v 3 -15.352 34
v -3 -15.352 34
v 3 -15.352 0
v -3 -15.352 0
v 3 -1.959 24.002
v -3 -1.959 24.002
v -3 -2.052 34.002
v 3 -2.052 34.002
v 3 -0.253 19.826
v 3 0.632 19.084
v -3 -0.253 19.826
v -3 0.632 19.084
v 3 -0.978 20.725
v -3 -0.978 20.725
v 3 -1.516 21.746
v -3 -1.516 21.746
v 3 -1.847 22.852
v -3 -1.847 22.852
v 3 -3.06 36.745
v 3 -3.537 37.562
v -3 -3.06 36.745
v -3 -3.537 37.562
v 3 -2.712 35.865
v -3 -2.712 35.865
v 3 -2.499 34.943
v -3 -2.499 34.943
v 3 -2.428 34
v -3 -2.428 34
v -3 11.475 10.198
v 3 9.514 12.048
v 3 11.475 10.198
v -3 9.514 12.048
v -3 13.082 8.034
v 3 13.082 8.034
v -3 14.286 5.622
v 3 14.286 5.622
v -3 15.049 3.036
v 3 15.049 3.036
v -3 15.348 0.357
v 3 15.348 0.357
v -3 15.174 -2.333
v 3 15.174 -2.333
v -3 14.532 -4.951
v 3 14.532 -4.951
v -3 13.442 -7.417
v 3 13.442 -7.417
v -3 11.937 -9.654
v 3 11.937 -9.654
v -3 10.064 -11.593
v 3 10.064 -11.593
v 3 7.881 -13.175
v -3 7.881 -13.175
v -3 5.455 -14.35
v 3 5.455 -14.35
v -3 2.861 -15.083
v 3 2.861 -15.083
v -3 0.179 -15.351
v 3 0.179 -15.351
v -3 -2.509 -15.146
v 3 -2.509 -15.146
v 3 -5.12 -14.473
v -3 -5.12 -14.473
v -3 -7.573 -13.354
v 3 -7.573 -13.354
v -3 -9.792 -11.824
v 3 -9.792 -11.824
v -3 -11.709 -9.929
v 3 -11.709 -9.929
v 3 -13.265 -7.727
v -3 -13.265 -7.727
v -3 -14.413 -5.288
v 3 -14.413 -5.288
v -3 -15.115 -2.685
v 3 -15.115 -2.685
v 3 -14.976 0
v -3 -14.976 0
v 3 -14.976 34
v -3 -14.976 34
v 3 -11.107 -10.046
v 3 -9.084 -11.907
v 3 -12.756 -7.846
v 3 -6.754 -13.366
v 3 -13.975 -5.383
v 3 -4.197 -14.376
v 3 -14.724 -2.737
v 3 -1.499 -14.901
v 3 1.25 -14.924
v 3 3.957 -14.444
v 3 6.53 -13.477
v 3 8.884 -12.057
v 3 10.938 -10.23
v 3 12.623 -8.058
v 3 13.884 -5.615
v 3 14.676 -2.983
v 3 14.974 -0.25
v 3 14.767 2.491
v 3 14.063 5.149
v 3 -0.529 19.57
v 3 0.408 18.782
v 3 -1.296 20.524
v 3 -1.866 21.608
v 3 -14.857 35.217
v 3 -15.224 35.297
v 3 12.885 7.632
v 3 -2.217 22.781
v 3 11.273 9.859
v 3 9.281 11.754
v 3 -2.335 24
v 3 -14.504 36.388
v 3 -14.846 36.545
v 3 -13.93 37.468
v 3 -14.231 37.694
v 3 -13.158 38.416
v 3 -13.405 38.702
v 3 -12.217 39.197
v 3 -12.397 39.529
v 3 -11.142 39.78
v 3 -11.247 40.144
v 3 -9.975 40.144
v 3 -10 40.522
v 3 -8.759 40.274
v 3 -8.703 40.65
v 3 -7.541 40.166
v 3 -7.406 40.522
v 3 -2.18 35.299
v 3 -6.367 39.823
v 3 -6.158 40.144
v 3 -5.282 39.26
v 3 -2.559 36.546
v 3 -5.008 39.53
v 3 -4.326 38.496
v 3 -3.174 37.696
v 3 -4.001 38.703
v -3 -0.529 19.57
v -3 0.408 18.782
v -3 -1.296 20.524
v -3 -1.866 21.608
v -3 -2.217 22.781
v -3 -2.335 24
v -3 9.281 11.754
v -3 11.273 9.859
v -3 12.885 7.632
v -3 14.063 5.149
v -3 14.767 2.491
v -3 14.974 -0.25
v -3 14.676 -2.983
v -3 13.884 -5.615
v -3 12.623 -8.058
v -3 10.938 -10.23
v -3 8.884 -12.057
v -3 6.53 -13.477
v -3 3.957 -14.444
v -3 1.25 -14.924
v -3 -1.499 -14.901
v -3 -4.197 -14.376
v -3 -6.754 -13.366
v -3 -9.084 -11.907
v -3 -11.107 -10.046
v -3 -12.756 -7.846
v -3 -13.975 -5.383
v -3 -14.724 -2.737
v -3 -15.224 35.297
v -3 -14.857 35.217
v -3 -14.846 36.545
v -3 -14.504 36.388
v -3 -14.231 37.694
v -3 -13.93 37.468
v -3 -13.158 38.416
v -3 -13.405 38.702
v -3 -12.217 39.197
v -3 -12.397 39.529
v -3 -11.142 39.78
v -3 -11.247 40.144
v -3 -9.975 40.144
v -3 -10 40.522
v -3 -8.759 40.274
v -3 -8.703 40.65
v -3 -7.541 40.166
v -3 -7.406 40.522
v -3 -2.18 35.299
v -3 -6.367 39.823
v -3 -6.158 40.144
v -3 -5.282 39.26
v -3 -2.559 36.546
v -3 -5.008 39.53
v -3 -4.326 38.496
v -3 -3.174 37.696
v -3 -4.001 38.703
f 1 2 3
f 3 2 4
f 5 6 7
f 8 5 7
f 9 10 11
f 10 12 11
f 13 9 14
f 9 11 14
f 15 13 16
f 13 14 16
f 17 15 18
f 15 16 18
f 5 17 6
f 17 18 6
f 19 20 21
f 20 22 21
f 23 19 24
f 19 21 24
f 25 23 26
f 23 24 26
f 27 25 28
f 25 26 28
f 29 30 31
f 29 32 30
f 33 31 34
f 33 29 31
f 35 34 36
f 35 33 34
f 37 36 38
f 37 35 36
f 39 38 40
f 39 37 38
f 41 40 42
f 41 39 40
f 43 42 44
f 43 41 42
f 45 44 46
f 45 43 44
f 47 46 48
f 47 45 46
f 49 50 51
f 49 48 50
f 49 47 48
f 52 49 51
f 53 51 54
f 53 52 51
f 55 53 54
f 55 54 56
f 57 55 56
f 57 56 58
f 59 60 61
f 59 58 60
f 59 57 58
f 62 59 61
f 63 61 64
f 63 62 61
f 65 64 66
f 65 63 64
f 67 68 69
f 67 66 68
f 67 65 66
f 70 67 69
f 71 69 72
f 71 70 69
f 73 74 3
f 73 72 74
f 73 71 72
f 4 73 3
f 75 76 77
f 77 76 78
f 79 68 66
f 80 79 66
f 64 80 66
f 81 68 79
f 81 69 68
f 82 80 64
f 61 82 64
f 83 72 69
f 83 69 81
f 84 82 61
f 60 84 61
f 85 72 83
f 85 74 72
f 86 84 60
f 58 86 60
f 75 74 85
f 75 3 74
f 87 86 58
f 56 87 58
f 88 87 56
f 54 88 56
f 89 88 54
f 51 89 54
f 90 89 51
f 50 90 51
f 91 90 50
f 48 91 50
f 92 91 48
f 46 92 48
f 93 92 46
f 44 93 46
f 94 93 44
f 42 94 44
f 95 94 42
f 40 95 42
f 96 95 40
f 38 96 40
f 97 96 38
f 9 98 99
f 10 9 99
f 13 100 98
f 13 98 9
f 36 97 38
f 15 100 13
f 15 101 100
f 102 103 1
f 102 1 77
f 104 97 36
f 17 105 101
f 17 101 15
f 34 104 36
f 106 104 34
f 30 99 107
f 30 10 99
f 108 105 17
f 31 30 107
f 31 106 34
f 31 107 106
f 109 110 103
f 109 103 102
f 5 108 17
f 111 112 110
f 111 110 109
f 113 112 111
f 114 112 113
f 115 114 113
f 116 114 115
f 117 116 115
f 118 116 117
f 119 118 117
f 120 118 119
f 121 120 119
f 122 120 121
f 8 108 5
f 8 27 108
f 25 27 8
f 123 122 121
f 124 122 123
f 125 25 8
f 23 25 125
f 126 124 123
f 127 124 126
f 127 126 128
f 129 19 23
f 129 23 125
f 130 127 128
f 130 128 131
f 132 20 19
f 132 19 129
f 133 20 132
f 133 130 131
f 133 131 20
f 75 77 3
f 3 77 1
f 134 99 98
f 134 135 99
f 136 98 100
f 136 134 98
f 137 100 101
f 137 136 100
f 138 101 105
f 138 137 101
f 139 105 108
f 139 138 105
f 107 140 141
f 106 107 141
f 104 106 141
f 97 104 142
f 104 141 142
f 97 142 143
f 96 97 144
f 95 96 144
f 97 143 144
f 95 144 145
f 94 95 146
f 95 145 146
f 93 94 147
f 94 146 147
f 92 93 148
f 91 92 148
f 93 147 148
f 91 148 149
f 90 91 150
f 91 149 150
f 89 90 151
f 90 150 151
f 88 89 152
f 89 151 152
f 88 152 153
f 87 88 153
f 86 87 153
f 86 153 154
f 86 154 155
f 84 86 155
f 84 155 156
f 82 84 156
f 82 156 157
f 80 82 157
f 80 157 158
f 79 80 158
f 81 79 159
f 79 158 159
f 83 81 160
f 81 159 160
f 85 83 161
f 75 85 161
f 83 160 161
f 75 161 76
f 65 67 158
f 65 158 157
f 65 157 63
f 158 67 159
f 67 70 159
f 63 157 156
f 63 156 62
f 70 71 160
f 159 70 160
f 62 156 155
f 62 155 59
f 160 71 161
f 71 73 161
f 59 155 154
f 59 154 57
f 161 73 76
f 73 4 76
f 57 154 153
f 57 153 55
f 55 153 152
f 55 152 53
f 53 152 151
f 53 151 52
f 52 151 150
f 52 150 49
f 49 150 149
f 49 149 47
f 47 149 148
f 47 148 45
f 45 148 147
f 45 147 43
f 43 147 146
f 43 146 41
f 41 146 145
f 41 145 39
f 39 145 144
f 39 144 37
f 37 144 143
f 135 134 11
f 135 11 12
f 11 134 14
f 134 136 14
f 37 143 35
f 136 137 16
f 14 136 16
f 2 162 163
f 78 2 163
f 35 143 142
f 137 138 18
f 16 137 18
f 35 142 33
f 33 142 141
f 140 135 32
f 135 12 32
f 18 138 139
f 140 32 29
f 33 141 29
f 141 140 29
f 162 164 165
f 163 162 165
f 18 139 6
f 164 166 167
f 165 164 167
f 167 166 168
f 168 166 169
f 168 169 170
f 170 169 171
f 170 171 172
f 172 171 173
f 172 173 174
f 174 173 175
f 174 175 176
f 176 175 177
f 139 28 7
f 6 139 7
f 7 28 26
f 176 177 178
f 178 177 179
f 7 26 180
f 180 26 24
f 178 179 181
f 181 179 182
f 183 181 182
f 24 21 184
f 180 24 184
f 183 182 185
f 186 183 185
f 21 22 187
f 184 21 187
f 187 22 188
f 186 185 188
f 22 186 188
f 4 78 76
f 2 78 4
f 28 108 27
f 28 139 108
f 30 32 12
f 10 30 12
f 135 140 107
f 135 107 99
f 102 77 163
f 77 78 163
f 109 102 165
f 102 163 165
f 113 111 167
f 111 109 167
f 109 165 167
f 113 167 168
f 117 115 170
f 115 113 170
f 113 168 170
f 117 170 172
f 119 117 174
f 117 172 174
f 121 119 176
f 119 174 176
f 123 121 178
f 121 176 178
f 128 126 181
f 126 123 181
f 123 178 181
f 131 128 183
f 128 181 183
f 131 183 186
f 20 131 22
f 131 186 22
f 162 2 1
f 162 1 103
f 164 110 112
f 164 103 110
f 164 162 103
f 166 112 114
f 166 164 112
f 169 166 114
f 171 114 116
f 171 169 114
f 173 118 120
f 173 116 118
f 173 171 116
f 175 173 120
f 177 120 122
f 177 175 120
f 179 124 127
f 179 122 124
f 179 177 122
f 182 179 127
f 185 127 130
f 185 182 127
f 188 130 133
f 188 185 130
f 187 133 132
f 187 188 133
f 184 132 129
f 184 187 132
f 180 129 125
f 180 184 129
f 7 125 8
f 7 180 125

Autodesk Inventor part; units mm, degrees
ref_plane "YZ Plane" through (0, 0, 0) normal (1, 0, 0) x (0, 1, 0)
ref_plane "XZ Plane" through (0, 0, 0) normal (0, 1, 0) x (-1, 0, 0)
ref_plane "Work Plane1" through (0, 0, 18) normal (0, 0, 1) x (1, 0, 0)
sketch "Sketch1" plane through (0, 0, 0) normal (1, 0, 0) x (0, 1, 0)
  arc A0 (-3.5373, 37.5621) -> (-14.976, 34) centre (-8.702, 34) ccw
  line L0 (0, 54.2276) -> (0, -32.966) construction
  line L1 (0, -32.966) -> (0, 54.2276) projected
  line L2 (-24.1835, 0) -> (27.9587, 0) construction
  line L3 (-14.976, 0) -> (-14.976, 34)
  line L4 (-24.1835, 18) -> (27.9587, 18) construction
  arc A1 (-2.428, 34) -> (-14.976, 34) centre (-8.702, 34) ccw
  arc A2 (-2.335, 24) -> (0.4081, 18.7817) centre (4, 24) ccw
  line L5 (-0.319, 19.362) -> (-0.4473, 19.4885)
  line L6 (-2.335, 24) -> (-2.428, 34)
  line L7 (9.2809, 11.7535) -> (0.4081, 18.7817)
  arc A3 (-14.976, 0) -> (9.2809, 11.7535) centre (0, 0) ccw
  line L8 (9.5142, 12.0484) -> (0.6316, 19.0844)
  arc A4 (-1.959, 24.0017) -> (0.6316, 19.0844) centre (4, 24) ccw
  line L9 (-1.959, 24.0017) -> (-2.052, 34.0018)
  arc A5 (-2.052, 34.0018) -> (-15.352, 34) centre (-8.702, 34) ccw
  line L10 (-15.352, 34) -> (-15.352, 0)
  arc A6 (-15.352, 0) -> (9.5142, 12.0484) centre (0, 0) ccw
  dimension "d2" = 12.548
  dimension "d3" = 34
  dimension "d4" = 8.702
  dimension "d8" = 12.67
  dimension "d9" = 4
  dimension "d10" = 6
  dimension "d11" = 29.952
  dimension "d12" = 0.376
extrude "Extrusion1" add sketch "Sketch1" along normal mid plane 6 contours A0 L3 A3 L1 A6 L10 A5 L9 A4 A2 L6 A1 | A3 L7 A2 L1 A4 L8 A6
equation "\"start\" = d3"
equation "\"d7\" = start"
properties part number "paseknowy"
